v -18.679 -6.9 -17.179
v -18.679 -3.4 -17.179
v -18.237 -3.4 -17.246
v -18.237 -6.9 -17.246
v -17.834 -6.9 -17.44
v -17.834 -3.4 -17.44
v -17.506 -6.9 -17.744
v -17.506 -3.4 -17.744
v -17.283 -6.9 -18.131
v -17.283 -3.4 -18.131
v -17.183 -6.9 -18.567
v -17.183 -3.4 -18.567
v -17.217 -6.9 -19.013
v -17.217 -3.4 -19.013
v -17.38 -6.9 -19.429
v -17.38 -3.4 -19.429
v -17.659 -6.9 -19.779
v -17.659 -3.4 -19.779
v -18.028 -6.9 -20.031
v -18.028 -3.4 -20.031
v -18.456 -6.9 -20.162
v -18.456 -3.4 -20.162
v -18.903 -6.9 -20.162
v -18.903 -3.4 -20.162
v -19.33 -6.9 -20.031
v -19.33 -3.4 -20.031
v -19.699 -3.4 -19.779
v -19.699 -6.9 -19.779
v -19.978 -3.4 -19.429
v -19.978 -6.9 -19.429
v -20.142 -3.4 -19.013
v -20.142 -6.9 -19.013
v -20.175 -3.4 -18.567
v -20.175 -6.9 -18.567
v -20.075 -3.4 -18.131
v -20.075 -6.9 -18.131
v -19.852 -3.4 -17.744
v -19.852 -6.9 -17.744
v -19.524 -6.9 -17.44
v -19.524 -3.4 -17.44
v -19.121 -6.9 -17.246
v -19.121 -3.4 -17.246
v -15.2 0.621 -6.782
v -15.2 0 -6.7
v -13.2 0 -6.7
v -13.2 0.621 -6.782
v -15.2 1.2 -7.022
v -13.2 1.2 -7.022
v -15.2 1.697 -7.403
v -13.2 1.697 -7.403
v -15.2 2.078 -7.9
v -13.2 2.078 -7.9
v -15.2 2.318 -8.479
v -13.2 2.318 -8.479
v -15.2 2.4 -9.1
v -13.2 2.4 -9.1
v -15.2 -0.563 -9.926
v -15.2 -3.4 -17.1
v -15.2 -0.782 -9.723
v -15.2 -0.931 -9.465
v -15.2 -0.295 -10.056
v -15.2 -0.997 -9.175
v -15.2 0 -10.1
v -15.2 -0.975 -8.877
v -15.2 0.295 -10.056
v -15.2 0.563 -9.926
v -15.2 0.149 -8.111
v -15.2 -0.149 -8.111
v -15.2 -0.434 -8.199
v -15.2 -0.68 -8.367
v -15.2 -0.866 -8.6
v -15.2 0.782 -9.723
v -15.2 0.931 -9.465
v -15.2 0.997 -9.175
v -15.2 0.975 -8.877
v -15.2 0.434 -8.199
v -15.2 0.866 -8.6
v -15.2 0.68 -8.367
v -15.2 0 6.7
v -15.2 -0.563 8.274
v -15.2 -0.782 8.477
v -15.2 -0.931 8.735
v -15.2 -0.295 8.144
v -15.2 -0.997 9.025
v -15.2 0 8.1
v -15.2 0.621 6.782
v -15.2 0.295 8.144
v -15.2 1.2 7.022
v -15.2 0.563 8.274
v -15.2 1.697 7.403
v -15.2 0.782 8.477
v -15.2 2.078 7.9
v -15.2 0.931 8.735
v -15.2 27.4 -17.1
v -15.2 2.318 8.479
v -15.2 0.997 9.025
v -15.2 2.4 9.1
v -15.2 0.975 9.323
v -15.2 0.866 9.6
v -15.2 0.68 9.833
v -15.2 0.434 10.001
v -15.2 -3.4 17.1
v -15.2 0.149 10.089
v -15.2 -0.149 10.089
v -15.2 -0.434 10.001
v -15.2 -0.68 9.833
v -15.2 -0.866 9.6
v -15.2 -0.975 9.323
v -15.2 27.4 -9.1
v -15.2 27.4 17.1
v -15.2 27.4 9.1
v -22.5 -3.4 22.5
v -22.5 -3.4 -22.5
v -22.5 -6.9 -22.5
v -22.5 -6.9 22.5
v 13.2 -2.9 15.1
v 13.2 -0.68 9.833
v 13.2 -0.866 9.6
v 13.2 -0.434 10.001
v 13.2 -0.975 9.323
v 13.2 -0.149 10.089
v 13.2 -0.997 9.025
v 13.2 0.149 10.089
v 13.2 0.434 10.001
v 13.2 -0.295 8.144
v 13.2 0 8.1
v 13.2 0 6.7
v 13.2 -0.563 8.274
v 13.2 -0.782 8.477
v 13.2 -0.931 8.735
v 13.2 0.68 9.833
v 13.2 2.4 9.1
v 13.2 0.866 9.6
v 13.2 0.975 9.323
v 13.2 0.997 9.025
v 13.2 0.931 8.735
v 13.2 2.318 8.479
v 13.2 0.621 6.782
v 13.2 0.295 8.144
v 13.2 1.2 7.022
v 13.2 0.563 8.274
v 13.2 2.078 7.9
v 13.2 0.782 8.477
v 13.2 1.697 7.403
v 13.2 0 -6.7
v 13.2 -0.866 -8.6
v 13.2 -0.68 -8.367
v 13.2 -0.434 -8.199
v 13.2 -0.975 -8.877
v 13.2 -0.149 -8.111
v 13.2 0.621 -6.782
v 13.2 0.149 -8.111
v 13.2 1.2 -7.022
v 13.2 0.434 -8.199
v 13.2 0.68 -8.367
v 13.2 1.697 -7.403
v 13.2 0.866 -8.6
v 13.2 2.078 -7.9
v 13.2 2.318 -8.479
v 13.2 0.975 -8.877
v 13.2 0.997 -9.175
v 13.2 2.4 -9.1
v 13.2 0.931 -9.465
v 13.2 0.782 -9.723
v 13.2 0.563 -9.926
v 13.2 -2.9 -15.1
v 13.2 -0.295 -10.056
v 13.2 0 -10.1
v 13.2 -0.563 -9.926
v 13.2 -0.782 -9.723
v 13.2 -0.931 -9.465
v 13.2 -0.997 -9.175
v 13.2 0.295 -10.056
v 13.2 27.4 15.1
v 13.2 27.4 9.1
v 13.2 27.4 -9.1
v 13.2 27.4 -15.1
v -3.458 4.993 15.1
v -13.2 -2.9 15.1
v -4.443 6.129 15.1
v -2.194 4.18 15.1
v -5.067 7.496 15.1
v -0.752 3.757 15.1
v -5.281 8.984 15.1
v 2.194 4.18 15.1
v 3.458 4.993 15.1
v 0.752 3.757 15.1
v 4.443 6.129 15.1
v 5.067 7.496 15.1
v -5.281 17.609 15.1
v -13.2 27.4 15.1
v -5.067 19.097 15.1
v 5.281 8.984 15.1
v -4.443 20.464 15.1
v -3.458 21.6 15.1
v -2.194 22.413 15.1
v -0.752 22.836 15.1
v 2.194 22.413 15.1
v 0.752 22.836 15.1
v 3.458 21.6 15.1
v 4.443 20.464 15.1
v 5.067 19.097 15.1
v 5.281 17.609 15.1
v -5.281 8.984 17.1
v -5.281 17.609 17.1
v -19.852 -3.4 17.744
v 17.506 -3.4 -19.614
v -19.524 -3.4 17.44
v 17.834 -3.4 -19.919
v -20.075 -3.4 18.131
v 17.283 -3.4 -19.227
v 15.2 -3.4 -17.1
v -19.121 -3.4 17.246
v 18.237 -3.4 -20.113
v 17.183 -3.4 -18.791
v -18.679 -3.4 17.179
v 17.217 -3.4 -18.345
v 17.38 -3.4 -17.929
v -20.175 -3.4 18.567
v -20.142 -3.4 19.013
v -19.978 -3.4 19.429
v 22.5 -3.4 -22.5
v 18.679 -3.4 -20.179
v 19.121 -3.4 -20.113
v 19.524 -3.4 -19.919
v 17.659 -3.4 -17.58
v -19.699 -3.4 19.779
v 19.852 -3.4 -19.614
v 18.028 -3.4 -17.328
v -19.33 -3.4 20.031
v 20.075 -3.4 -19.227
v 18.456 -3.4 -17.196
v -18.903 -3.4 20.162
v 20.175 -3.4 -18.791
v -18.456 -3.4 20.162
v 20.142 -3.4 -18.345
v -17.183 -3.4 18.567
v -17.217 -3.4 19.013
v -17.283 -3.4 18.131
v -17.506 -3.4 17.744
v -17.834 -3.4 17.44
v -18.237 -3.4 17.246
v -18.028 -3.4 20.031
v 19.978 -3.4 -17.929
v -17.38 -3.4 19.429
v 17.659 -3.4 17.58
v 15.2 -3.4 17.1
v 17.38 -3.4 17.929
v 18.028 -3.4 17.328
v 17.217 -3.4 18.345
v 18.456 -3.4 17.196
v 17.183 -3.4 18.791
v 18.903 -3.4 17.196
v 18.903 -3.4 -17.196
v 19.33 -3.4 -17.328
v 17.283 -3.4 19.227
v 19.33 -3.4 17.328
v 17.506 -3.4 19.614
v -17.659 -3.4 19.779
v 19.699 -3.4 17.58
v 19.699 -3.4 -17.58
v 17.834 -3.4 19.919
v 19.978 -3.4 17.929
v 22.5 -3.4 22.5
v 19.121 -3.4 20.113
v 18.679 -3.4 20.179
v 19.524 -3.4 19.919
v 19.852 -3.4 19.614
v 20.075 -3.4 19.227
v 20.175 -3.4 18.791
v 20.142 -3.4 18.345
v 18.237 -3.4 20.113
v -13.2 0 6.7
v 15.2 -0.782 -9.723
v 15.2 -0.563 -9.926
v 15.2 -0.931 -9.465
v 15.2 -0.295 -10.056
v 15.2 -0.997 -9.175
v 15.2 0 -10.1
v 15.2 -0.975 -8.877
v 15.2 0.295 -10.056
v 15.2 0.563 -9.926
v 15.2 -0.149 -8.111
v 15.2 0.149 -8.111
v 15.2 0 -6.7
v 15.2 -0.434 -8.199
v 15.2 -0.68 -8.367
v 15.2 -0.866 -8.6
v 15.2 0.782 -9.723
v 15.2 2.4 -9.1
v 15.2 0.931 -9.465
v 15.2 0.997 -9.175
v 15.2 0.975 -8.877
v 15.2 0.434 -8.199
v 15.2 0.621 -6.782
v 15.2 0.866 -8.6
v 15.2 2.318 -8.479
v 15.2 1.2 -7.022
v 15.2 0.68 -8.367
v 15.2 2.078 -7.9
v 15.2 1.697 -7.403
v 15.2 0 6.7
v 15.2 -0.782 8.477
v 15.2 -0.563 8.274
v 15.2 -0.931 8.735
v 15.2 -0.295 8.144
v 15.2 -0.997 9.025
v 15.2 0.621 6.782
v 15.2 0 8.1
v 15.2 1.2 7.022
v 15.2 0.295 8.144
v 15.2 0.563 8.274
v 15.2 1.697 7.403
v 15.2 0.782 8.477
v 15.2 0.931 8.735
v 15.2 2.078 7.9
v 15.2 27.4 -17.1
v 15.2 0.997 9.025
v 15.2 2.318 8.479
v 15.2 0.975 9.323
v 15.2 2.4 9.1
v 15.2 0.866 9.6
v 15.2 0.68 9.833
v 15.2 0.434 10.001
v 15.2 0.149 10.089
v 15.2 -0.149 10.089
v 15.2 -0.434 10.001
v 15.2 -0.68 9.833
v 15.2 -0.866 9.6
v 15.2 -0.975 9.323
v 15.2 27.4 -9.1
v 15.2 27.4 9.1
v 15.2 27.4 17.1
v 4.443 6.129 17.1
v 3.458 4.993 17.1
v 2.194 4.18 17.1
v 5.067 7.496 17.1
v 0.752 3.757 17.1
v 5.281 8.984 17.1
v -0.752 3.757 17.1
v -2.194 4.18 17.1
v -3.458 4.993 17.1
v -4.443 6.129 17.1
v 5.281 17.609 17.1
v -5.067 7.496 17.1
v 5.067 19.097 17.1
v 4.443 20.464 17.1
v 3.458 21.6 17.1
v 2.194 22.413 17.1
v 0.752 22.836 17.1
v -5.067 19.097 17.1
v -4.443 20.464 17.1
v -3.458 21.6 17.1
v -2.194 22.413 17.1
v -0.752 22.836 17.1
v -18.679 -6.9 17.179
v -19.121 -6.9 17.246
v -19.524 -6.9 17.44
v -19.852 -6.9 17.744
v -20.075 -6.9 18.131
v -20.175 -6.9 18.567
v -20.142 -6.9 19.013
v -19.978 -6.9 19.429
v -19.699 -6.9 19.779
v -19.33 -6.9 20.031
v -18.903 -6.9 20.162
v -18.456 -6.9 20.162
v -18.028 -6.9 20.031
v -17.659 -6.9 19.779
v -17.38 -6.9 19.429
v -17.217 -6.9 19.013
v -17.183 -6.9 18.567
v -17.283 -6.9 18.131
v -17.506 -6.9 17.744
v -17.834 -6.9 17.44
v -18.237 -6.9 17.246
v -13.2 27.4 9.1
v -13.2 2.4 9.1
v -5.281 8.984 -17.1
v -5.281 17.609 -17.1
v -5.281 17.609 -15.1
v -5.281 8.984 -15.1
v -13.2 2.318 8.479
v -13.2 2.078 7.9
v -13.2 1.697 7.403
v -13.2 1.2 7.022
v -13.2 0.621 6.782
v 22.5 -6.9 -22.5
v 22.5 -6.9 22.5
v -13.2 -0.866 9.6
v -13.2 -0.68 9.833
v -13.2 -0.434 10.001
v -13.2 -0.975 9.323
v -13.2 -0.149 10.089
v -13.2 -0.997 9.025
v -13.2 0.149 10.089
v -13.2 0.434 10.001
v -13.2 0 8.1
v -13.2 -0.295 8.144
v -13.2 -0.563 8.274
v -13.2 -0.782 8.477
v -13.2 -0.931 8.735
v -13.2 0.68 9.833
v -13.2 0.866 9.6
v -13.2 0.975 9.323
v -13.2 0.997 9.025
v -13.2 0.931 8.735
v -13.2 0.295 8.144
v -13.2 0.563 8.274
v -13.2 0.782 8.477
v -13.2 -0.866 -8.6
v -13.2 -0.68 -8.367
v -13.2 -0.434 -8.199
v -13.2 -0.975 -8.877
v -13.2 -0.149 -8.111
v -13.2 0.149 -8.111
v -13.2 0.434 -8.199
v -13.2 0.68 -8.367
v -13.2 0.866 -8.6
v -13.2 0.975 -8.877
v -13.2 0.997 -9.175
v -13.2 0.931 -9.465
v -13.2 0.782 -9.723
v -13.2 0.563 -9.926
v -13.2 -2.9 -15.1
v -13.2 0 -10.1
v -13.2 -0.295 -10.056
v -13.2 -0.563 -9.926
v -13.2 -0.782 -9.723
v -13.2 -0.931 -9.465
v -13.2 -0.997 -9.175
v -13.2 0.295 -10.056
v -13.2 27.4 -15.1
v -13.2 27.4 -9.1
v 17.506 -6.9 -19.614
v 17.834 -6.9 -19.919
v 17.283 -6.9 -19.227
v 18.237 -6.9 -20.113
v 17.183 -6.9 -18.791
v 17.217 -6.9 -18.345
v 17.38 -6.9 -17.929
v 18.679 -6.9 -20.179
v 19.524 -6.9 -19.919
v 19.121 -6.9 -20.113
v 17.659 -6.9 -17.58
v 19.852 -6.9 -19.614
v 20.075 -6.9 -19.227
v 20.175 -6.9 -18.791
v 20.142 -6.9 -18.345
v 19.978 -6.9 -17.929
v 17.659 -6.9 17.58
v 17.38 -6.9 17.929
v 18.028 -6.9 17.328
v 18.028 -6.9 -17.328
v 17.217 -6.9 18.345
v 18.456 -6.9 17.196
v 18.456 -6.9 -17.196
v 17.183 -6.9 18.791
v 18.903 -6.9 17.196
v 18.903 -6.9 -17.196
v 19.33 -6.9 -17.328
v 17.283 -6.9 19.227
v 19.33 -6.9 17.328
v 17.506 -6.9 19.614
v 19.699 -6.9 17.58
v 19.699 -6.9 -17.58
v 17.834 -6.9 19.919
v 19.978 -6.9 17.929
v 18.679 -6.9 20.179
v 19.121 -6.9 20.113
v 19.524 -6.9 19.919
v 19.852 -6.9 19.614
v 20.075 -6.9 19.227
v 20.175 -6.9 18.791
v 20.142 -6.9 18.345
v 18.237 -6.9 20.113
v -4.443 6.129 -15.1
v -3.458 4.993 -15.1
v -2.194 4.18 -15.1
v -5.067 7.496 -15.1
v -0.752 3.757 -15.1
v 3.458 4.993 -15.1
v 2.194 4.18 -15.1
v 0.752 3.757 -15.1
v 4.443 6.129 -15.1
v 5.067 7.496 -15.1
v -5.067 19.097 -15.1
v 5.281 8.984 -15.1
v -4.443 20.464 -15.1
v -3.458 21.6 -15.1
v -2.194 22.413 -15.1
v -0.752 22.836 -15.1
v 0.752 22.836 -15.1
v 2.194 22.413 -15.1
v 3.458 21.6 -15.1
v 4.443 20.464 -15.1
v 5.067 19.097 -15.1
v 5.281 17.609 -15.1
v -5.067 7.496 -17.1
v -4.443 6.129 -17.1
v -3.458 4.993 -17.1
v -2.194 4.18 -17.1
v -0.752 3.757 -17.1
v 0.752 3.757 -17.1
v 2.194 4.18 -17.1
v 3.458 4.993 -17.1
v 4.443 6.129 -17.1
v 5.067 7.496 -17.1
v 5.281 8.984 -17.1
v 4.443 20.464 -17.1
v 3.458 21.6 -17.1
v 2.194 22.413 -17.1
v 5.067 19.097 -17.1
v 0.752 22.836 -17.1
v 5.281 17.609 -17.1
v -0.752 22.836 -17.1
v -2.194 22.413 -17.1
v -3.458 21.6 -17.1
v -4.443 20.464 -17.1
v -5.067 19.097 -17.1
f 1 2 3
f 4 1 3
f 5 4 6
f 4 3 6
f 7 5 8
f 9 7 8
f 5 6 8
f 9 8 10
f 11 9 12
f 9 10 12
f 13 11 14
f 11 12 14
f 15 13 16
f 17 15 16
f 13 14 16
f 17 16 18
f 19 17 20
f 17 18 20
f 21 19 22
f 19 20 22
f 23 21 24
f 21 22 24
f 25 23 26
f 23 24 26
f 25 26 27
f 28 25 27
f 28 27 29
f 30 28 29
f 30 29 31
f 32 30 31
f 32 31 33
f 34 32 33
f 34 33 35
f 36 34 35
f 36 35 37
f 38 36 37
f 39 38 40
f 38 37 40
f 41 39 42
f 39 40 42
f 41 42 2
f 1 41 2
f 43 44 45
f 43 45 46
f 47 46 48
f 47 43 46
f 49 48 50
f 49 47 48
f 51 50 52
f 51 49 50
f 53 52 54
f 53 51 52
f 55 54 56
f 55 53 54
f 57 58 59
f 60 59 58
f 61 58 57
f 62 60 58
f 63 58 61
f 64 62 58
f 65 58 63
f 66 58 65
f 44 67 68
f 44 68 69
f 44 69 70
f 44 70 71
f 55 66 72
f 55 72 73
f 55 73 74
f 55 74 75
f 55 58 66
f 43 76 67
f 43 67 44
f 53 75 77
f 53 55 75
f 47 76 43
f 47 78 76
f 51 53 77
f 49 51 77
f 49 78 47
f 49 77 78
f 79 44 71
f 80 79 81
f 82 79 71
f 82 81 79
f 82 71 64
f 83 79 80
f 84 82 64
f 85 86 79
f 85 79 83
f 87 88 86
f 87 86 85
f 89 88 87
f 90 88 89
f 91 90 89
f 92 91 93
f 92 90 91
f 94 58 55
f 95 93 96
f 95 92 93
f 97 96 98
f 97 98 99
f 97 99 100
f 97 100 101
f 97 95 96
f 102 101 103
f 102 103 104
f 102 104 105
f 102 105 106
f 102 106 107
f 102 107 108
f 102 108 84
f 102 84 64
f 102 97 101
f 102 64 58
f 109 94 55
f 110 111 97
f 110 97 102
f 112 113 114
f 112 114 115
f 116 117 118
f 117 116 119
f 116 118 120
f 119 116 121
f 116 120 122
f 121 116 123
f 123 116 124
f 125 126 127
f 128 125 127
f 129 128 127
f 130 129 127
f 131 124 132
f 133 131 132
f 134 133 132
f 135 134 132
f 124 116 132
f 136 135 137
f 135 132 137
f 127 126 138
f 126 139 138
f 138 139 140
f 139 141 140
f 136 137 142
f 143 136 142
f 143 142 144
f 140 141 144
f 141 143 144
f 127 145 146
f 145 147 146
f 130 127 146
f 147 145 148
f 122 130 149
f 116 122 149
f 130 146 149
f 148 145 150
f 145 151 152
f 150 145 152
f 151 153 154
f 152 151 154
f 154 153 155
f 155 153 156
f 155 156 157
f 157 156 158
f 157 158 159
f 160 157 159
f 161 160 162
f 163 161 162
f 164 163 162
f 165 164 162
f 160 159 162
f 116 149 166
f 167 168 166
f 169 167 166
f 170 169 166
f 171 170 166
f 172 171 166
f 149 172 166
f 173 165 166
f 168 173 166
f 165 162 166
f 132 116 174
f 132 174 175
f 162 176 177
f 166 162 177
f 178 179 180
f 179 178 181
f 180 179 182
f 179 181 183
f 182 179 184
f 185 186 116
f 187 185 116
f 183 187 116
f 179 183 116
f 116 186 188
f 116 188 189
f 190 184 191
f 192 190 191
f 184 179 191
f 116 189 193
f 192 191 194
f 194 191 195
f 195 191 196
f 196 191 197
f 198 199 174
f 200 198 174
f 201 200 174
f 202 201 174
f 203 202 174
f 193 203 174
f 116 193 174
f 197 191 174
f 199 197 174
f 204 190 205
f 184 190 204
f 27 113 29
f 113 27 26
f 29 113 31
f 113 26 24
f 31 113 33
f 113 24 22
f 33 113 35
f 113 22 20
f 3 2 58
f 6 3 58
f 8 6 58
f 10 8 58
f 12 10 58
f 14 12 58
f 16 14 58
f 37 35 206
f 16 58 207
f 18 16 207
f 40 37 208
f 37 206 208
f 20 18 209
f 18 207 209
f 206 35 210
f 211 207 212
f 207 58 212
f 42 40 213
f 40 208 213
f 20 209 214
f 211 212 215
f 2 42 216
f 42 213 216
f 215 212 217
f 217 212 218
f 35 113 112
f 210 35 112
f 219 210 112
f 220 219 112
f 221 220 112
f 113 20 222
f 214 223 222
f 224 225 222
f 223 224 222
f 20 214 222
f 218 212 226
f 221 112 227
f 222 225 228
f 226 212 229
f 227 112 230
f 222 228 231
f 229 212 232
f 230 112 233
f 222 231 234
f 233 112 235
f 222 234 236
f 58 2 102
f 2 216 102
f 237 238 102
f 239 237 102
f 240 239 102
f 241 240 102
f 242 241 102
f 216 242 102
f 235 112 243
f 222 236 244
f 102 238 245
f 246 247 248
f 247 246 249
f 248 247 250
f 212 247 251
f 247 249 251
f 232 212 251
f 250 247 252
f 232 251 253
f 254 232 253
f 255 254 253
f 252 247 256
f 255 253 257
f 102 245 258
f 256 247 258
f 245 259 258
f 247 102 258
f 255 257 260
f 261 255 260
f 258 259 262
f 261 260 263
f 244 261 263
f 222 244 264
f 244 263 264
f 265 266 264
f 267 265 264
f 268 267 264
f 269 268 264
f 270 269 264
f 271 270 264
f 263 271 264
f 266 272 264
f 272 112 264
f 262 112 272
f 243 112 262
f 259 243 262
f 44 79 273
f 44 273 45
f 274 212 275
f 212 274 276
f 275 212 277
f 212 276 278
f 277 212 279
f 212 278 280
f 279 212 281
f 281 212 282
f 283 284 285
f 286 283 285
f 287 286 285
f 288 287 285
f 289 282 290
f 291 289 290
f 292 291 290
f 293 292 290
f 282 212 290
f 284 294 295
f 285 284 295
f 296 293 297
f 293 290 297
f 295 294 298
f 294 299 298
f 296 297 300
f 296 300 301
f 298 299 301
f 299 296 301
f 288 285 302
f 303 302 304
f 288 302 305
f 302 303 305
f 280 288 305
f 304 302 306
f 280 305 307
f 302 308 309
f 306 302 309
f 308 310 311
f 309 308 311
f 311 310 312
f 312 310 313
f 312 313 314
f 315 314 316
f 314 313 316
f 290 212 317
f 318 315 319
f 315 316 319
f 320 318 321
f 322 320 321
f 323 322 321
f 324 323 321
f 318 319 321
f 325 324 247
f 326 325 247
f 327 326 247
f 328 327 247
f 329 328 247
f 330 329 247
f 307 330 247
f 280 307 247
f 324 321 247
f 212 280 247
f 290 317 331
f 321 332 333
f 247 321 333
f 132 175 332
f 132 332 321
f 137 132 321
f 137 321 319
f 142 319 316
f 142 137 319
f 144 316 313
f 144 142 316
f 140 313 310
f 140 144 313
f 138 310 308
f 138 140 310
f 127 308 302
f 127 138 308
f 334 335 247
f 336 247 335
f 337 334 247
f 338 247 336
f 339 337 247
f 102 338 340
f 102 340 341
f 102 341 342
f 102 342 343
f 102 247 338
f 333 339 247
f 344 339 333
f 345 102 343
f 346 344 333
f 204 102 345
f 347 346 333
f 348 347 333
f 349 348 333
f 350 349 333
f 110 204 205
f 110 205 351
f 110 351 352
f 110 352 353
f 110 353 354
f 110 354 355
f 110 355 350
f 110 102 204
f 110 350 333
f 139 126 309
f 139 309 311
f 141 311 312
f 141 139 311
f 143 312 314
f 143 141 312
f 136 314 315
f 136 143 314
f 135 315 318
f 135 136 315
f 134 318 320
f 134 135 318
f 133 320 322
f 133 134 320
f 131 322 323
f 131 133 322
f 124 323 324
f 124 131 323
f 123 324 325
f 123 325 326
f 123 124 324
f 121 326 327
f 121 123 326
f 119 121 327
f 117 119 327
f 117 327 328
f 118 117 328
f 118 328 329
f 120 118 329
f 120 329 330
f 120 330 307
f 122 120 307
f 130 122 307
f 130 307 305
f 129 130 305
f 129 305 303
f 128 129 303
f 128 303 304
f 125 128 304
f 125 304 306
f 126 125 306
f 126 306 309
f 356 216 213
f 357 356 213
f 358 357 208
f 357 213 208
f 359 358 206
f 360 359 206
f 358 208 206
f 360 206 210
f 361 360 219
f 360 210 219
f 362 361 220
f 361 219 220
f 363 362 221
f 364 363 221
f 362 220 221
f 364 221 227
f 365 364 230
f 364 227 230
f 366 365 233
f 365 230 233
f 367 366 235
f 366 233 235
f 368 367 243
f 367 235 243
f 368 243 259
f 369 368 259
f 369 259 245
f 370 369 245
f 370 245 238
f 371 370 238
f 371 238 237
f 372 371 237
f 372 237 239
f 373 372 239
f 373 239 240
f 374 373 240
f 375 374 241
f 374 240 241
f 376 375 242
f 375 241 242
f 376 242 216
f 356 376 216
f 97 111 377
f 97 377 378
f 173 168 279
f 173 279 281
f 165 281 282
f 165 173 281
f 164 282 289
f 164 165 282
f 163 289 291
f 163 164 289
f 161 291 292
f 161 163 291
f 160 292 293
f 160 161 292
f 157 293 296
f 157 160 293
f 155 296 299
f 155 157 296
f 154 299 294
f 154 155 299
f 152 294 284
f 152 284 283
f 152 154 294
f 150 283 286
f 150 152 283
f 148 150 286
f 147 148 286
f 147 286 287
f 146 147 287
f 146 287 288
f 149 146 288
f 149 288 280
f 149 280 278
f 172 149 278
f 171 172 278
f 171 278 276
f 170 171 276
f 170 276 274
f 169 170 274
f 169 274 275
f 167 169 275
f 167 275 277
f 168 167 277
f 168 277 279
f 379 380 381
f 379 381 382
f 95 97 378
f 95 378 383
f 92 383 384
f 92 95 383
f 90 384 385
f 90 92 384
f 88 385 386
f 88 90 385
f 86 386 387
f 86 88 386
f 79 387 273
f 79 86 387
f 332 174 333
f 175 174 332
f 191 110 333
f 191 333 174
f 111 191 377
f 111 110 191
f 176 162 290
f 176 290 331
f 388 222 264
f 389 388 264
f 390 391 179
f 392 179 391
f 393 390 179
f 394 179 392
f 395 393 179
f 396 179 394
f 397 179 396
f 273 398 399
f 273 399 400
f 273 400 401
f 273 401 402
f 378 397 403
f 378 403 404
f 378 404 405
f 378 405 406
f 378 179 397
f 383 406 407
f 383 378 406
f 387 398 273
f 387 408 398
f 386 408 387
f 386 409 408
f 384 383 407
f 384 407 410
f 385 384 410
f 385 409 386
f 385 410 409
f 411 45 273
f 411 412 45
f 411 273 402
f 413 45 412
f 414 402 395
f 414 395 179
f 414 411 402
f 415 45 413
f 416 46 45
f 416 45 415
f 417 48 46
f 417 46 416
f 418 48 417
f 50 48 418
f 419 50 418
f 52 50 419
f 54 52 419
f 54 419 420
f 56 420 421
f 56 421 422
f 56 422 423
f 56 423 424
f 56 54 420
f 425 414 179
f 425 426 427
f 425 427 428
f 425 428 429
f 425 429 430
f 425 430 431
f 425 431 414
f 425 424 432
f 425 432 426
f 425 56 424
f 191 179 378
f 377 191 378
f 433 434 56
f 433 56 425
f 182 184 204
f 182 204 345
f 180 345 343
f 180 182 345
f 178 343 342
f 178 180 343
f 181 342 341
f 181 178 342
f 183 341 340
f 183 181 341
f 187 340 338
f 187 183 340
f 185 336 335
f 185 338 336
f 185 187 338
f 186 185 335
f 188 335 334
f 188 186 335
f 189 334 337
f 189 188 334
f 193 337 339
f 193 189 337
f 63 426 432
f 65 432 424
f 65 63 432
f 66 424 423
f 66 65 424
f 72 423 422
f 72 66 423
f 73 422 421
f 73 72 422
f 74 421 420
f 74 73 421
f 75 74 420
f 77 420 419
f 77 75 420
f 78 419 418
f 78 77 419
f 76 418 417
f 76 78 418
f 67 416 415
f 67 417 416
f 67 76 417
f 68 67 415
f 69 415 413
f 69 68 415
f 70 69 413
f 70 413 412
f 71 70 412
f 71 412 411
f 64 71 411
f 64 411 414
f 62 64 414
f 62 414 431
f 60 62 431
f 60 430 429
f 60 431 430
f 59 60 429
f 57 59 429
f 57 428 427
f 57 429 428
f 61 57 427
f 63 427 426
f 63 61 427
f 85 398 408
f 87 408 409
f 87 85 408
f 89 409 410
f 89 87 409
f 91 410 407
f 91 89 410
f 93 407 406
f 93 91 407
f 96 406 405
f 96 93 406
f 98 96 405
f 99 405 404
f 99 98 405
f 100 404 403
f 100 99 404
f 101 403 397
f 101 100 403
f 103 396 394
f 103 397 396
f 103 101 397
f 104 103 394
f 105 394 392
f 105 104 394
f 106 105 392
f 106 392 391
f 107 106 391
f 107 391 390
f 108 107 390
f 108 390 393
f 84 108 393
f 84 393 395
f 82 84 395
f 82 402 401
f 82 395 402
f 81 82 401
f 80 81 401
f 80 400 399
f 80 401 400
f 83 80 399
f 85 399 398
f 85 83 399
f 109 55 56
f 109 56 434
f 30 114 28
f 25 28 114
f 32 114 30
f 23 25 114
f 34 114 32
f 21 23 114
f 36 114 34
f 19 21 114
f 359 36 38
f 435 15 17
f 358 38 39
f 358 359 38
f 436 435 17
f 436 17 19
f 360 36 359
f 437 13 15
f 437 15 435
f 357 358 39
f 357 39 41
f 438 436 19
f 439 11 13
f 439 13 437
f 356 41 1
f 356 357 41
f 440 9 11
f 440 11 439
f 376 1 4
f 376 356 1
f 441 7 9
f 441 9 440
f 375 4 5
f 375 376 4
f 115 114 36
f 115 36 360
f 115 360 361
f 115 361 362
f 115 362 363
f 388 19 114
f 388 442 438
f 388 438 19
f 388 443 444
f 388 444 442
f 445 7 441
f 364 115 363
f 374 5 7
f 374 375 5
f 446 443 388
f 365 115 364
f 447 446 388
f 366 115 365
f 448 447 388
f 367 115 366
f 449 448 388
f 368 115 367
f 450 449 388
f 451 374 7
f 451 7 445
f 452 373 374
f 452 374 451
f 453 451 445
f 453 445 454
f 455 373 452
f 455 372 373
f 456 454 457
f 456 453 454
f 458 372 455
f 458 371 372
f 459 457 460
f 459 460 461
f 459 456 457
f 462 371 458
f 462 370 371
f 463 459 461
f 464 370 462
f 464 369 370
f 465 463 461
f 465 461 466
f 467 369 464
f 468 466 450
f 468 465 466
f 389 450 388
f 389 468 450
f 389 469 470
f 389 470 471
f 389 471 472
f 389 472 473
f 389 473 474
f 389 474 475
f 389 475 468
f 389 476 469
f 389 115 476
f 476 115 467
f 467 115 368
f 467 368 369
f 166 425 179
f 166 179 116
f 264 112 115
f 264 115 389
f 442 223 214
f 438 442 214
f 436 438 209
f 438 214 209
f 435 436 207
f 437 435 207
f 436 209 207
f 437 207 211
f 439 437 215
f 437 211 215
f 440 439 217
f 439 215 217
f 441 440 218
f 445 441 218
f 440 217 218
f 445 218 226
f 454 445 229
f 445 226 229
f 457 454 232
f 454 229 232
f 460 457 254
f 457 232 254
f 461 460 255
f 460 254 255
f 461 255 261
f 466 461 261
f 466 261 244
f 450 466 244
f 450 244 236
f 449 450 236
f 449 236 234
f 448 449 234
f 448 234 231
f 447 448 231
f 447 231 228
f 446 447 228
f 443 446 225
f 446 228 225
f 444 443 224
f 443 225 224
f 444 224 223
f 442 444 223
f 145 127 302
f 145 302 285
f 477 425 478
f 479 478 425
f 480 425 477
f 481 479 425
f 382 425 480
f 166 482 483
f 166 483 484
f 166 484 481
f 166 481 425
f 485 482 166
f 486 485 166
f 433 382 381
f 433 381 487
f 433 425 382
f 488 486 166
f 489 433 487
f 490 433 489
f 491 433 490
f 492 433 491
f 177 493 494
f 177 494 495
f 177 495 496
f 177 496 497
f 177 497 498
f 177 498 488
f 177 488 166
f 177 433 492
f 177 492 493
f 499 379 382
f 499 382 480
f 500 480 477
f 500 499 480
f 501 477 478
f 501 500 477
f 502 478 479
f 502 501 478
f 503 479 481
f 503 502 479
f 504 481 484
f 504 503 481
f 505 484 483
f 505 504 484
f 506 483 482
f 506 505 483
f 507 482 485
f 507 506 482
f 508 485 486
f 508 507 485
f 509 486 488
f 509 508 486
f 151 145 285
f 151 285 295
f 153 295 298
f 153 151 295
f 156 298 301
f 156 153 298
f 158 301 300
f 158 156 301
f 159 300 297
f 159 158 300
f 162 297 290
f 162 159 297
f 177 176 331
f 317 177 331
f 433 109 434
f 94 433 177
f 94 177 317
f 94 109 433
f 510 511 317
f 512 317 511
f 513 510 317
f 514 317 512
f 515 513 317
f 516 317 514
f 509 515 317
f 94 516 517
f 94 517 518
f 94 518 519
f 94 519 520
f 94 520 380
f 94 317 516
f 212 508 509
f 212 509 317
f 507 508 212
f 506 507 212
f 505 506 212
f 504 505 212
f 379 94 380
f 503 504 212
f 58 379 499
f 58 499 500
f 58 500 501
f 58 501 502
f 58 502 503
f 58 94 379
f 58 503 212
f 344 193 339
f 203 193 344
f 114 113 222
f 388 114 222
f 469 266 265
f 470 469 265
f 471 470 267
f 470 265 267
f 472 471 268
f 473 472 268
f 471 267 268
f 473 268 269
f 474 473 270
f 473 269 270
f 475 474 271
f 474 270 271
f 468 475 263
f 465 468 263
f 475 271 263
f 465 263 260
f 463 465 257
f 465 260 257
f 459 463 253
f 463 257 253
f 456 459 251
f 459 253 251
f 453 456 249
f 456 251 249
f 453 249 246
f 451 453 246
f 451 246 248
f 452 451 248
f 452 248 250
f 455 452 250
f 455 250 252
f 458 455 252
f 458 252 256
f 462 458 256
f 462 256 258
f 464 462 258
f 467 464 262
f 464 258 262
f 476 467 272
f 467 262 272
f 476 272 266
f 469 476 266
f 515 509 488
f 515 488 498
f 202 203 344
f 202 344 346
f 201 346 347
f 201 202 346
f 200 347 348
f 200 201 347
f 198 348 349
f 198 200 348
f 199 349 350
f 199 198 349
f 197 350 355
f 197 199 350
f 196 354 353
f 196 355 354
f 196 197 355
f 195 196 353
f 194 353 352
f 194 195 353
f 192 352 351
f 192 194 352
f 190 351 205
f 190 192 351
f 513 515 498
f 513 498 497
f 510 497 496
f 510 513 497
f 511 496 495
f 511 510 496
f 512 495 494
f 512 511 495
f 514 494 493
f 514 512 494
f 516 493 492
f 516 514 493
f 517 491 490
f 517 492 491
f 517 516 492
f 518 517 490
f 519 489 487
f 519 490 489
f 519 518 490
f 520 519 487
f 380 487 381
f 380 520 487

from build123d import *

# Parameters (mm, degrees)
EXTRUDE_1_DEPTH      = 15.2
EXTRUDE_1_DEPTH_BACK = 15.2
SKETCH_1_R           = 1
SKETCH_2_W           = 26.4
SKETCH_2_H           = 30.2
CUT_EXTRUDE_1_DEPTH  = 30.3
CUT_EXTRUDE_2_REACH  = 48.384
EXTRUDE_2_DEPTH      = 2
EXTRUDE_2_DEPTH_BACK = 1.5
SKETCH_4_W           = 45
SKETCH_4_H           = 45
SKETCH_5_R           = 1.5
CUT_EXTRUDE_3_DEPTH  = 3.5


with BuildPart() as part:
    # 草图1 → 凸台-拉伸1 (new, two sides: drawn at the far end of the back side and taken through both)
    with BuildSketch(Plane(origin=(0, 0, 0), x_dir=(0, 0, -1), z_dir=(1, 0, 0)).offset(-EXTRUDE_1_DEPTH_BACK)):
        with BuildLine():
            Line((-6.7, 0), (6.7, 0))
            ThreePointArc((6.7, 0), (7.402943725, 1.697056275), (9.1, 2.4))
            Line((9.1, 2.4), (9.1, 27.4))
            Line((9.1, 27.4), (17.1, 27.4))
            Line((17.1, 27.4), (17.1, 0))
            Line((17.1, 0), (17.1, -4.9))
            Line((17.1, -4.9), (9.1, -4.9))
            Line((9.1, -4.9), (-9.1, -4.9))
            Line((-9.1, -4.9), (-17.1, -4.9))
            Line((-17.1, -4.9), (-17.1, 0))
            Line((-17.1, 0), (-17.1, 27.4))
            Line((-17.1, 27.4), (-9.1, 27.4))
            Line((-9.1, 27.4), (-9.1, 2.4))
            ThreePointArc((-9.1, 2.4), (-7.402943725, 1.697056275), (-6.7, 0))
        make_face()
        with Locations((9.1, 0)):
            Circle(SKETCH_1_R, mode=Mode.SUBTRACT)
        with Locations((-9.1, 0)):
            Circle(SKETCH_1_R, mode=Mode.SUBTRACT)
    extrude(amount=EXTRUDE_1_DEPTH + EXTRUDE_1_DEPTH_BACK)

    # 草图2 → 切除-拉伸1 (cut)
    with BuildSketch(Plane(origin=(0, 27.4, 0), x_dir=(1, 0, 0), z_dir=(0, 1, 0))):
        Rectangle(SKETCH_2_W, SKETCH_2_H)
    extrude(amount=-CUT_EXTRUDE_1_DEPTH, mode=Mode.SUBTRACT)

    # 切除-拉伸2: up to this face of the body (flat: up to its plane)
    cut_extrude_2_end = Plane(part.part.faces().sort_by_distance((0, 11.25, 17.1))[0])
    # 草图3 → 切除-拉伸2 (cut, up to the picked face)
    with BuildSketch(Plane(origin=(0, 0, -17.1), x_dir=(-1, 0, 0), z_dir=(0, 0, -1)), mode=Mode.PRIVATE) as cut_extrude_2_sk1:
        with BuildLine():
            Line((5.280872039, 17.60905008), (5.280872039, 8.98362575))
            ThreePointArc((5.280872039, 8.98362575), (0, 3.702753711), (-5.280872039, 8.98362575))
            Line((-5.280872039, 8.98362575), (-5.280872039, 17.60905008))
            ThreePointArc((-5.280872039, 17.60905008), (0, 22.889922119), (5.280872039, 17.60905008))
        make_face()
    cut_extrude_2_tool1 = split(extrude(cut_extrude_2_sk1.sketch, amount=-CUT_EXTRUDE_2_REACH, mode=Mode.PRIVATE), bisect_by=cut_extrude_2_end, keep=Keep.BOTH, mode=Mode.PRIVATE)
    add(cut_extrude_2_tool1.solids().sort_by(Axis((0, 13.296338, -17.1), (0, 0, 1)))[0], mode=Mode.SUBTRACT)

    # 草图4 → 凸台-拉伸2 (add, two sides: drawn at the far end of the back side and taken through both)
    with BuildSketch(Plane.XZ.offset(4.9).offset(-EXTRUDE_2_DEPTH_BACK)):
        Rectangle(SKETCH_4_W, SKETCH_4_H)
    extrude(amount=EXTRUDE_2_DEPTH + EXTRUDE_2_DEPTH_BACK)

    # 草图5 → 切除-拉伸3 (cut)
    with BuildSketch(Plane(origin=(0, -3.4, 0), x_dir=(1, 0, 0), z_dir=(0, 1, 0))):
        with Locations(Location((-18.679189152, 18.679189152, 0), (0, 0, 270))):
            Circle(SKETCH_5_R)
        with Locations(Location((18.679189152, 18.679189152, 0), (0, 0, 90))):
            Circle(SKETCH_5_R)
        with Locations(Location((-18.679189152, -18.679189152, 0), (0, 0, 90))):
            Circle(SKETCH_5_R)
        with Locations(Location((18.679189152, -18.679189152, 0), (0, 0, 270))):
            Circle(SKETCH_5_R)
    extrude(amount=-CUT_EXTRUDE_3_DEPTH, mode=Mode.SUBTRACT)


solid = part.part
